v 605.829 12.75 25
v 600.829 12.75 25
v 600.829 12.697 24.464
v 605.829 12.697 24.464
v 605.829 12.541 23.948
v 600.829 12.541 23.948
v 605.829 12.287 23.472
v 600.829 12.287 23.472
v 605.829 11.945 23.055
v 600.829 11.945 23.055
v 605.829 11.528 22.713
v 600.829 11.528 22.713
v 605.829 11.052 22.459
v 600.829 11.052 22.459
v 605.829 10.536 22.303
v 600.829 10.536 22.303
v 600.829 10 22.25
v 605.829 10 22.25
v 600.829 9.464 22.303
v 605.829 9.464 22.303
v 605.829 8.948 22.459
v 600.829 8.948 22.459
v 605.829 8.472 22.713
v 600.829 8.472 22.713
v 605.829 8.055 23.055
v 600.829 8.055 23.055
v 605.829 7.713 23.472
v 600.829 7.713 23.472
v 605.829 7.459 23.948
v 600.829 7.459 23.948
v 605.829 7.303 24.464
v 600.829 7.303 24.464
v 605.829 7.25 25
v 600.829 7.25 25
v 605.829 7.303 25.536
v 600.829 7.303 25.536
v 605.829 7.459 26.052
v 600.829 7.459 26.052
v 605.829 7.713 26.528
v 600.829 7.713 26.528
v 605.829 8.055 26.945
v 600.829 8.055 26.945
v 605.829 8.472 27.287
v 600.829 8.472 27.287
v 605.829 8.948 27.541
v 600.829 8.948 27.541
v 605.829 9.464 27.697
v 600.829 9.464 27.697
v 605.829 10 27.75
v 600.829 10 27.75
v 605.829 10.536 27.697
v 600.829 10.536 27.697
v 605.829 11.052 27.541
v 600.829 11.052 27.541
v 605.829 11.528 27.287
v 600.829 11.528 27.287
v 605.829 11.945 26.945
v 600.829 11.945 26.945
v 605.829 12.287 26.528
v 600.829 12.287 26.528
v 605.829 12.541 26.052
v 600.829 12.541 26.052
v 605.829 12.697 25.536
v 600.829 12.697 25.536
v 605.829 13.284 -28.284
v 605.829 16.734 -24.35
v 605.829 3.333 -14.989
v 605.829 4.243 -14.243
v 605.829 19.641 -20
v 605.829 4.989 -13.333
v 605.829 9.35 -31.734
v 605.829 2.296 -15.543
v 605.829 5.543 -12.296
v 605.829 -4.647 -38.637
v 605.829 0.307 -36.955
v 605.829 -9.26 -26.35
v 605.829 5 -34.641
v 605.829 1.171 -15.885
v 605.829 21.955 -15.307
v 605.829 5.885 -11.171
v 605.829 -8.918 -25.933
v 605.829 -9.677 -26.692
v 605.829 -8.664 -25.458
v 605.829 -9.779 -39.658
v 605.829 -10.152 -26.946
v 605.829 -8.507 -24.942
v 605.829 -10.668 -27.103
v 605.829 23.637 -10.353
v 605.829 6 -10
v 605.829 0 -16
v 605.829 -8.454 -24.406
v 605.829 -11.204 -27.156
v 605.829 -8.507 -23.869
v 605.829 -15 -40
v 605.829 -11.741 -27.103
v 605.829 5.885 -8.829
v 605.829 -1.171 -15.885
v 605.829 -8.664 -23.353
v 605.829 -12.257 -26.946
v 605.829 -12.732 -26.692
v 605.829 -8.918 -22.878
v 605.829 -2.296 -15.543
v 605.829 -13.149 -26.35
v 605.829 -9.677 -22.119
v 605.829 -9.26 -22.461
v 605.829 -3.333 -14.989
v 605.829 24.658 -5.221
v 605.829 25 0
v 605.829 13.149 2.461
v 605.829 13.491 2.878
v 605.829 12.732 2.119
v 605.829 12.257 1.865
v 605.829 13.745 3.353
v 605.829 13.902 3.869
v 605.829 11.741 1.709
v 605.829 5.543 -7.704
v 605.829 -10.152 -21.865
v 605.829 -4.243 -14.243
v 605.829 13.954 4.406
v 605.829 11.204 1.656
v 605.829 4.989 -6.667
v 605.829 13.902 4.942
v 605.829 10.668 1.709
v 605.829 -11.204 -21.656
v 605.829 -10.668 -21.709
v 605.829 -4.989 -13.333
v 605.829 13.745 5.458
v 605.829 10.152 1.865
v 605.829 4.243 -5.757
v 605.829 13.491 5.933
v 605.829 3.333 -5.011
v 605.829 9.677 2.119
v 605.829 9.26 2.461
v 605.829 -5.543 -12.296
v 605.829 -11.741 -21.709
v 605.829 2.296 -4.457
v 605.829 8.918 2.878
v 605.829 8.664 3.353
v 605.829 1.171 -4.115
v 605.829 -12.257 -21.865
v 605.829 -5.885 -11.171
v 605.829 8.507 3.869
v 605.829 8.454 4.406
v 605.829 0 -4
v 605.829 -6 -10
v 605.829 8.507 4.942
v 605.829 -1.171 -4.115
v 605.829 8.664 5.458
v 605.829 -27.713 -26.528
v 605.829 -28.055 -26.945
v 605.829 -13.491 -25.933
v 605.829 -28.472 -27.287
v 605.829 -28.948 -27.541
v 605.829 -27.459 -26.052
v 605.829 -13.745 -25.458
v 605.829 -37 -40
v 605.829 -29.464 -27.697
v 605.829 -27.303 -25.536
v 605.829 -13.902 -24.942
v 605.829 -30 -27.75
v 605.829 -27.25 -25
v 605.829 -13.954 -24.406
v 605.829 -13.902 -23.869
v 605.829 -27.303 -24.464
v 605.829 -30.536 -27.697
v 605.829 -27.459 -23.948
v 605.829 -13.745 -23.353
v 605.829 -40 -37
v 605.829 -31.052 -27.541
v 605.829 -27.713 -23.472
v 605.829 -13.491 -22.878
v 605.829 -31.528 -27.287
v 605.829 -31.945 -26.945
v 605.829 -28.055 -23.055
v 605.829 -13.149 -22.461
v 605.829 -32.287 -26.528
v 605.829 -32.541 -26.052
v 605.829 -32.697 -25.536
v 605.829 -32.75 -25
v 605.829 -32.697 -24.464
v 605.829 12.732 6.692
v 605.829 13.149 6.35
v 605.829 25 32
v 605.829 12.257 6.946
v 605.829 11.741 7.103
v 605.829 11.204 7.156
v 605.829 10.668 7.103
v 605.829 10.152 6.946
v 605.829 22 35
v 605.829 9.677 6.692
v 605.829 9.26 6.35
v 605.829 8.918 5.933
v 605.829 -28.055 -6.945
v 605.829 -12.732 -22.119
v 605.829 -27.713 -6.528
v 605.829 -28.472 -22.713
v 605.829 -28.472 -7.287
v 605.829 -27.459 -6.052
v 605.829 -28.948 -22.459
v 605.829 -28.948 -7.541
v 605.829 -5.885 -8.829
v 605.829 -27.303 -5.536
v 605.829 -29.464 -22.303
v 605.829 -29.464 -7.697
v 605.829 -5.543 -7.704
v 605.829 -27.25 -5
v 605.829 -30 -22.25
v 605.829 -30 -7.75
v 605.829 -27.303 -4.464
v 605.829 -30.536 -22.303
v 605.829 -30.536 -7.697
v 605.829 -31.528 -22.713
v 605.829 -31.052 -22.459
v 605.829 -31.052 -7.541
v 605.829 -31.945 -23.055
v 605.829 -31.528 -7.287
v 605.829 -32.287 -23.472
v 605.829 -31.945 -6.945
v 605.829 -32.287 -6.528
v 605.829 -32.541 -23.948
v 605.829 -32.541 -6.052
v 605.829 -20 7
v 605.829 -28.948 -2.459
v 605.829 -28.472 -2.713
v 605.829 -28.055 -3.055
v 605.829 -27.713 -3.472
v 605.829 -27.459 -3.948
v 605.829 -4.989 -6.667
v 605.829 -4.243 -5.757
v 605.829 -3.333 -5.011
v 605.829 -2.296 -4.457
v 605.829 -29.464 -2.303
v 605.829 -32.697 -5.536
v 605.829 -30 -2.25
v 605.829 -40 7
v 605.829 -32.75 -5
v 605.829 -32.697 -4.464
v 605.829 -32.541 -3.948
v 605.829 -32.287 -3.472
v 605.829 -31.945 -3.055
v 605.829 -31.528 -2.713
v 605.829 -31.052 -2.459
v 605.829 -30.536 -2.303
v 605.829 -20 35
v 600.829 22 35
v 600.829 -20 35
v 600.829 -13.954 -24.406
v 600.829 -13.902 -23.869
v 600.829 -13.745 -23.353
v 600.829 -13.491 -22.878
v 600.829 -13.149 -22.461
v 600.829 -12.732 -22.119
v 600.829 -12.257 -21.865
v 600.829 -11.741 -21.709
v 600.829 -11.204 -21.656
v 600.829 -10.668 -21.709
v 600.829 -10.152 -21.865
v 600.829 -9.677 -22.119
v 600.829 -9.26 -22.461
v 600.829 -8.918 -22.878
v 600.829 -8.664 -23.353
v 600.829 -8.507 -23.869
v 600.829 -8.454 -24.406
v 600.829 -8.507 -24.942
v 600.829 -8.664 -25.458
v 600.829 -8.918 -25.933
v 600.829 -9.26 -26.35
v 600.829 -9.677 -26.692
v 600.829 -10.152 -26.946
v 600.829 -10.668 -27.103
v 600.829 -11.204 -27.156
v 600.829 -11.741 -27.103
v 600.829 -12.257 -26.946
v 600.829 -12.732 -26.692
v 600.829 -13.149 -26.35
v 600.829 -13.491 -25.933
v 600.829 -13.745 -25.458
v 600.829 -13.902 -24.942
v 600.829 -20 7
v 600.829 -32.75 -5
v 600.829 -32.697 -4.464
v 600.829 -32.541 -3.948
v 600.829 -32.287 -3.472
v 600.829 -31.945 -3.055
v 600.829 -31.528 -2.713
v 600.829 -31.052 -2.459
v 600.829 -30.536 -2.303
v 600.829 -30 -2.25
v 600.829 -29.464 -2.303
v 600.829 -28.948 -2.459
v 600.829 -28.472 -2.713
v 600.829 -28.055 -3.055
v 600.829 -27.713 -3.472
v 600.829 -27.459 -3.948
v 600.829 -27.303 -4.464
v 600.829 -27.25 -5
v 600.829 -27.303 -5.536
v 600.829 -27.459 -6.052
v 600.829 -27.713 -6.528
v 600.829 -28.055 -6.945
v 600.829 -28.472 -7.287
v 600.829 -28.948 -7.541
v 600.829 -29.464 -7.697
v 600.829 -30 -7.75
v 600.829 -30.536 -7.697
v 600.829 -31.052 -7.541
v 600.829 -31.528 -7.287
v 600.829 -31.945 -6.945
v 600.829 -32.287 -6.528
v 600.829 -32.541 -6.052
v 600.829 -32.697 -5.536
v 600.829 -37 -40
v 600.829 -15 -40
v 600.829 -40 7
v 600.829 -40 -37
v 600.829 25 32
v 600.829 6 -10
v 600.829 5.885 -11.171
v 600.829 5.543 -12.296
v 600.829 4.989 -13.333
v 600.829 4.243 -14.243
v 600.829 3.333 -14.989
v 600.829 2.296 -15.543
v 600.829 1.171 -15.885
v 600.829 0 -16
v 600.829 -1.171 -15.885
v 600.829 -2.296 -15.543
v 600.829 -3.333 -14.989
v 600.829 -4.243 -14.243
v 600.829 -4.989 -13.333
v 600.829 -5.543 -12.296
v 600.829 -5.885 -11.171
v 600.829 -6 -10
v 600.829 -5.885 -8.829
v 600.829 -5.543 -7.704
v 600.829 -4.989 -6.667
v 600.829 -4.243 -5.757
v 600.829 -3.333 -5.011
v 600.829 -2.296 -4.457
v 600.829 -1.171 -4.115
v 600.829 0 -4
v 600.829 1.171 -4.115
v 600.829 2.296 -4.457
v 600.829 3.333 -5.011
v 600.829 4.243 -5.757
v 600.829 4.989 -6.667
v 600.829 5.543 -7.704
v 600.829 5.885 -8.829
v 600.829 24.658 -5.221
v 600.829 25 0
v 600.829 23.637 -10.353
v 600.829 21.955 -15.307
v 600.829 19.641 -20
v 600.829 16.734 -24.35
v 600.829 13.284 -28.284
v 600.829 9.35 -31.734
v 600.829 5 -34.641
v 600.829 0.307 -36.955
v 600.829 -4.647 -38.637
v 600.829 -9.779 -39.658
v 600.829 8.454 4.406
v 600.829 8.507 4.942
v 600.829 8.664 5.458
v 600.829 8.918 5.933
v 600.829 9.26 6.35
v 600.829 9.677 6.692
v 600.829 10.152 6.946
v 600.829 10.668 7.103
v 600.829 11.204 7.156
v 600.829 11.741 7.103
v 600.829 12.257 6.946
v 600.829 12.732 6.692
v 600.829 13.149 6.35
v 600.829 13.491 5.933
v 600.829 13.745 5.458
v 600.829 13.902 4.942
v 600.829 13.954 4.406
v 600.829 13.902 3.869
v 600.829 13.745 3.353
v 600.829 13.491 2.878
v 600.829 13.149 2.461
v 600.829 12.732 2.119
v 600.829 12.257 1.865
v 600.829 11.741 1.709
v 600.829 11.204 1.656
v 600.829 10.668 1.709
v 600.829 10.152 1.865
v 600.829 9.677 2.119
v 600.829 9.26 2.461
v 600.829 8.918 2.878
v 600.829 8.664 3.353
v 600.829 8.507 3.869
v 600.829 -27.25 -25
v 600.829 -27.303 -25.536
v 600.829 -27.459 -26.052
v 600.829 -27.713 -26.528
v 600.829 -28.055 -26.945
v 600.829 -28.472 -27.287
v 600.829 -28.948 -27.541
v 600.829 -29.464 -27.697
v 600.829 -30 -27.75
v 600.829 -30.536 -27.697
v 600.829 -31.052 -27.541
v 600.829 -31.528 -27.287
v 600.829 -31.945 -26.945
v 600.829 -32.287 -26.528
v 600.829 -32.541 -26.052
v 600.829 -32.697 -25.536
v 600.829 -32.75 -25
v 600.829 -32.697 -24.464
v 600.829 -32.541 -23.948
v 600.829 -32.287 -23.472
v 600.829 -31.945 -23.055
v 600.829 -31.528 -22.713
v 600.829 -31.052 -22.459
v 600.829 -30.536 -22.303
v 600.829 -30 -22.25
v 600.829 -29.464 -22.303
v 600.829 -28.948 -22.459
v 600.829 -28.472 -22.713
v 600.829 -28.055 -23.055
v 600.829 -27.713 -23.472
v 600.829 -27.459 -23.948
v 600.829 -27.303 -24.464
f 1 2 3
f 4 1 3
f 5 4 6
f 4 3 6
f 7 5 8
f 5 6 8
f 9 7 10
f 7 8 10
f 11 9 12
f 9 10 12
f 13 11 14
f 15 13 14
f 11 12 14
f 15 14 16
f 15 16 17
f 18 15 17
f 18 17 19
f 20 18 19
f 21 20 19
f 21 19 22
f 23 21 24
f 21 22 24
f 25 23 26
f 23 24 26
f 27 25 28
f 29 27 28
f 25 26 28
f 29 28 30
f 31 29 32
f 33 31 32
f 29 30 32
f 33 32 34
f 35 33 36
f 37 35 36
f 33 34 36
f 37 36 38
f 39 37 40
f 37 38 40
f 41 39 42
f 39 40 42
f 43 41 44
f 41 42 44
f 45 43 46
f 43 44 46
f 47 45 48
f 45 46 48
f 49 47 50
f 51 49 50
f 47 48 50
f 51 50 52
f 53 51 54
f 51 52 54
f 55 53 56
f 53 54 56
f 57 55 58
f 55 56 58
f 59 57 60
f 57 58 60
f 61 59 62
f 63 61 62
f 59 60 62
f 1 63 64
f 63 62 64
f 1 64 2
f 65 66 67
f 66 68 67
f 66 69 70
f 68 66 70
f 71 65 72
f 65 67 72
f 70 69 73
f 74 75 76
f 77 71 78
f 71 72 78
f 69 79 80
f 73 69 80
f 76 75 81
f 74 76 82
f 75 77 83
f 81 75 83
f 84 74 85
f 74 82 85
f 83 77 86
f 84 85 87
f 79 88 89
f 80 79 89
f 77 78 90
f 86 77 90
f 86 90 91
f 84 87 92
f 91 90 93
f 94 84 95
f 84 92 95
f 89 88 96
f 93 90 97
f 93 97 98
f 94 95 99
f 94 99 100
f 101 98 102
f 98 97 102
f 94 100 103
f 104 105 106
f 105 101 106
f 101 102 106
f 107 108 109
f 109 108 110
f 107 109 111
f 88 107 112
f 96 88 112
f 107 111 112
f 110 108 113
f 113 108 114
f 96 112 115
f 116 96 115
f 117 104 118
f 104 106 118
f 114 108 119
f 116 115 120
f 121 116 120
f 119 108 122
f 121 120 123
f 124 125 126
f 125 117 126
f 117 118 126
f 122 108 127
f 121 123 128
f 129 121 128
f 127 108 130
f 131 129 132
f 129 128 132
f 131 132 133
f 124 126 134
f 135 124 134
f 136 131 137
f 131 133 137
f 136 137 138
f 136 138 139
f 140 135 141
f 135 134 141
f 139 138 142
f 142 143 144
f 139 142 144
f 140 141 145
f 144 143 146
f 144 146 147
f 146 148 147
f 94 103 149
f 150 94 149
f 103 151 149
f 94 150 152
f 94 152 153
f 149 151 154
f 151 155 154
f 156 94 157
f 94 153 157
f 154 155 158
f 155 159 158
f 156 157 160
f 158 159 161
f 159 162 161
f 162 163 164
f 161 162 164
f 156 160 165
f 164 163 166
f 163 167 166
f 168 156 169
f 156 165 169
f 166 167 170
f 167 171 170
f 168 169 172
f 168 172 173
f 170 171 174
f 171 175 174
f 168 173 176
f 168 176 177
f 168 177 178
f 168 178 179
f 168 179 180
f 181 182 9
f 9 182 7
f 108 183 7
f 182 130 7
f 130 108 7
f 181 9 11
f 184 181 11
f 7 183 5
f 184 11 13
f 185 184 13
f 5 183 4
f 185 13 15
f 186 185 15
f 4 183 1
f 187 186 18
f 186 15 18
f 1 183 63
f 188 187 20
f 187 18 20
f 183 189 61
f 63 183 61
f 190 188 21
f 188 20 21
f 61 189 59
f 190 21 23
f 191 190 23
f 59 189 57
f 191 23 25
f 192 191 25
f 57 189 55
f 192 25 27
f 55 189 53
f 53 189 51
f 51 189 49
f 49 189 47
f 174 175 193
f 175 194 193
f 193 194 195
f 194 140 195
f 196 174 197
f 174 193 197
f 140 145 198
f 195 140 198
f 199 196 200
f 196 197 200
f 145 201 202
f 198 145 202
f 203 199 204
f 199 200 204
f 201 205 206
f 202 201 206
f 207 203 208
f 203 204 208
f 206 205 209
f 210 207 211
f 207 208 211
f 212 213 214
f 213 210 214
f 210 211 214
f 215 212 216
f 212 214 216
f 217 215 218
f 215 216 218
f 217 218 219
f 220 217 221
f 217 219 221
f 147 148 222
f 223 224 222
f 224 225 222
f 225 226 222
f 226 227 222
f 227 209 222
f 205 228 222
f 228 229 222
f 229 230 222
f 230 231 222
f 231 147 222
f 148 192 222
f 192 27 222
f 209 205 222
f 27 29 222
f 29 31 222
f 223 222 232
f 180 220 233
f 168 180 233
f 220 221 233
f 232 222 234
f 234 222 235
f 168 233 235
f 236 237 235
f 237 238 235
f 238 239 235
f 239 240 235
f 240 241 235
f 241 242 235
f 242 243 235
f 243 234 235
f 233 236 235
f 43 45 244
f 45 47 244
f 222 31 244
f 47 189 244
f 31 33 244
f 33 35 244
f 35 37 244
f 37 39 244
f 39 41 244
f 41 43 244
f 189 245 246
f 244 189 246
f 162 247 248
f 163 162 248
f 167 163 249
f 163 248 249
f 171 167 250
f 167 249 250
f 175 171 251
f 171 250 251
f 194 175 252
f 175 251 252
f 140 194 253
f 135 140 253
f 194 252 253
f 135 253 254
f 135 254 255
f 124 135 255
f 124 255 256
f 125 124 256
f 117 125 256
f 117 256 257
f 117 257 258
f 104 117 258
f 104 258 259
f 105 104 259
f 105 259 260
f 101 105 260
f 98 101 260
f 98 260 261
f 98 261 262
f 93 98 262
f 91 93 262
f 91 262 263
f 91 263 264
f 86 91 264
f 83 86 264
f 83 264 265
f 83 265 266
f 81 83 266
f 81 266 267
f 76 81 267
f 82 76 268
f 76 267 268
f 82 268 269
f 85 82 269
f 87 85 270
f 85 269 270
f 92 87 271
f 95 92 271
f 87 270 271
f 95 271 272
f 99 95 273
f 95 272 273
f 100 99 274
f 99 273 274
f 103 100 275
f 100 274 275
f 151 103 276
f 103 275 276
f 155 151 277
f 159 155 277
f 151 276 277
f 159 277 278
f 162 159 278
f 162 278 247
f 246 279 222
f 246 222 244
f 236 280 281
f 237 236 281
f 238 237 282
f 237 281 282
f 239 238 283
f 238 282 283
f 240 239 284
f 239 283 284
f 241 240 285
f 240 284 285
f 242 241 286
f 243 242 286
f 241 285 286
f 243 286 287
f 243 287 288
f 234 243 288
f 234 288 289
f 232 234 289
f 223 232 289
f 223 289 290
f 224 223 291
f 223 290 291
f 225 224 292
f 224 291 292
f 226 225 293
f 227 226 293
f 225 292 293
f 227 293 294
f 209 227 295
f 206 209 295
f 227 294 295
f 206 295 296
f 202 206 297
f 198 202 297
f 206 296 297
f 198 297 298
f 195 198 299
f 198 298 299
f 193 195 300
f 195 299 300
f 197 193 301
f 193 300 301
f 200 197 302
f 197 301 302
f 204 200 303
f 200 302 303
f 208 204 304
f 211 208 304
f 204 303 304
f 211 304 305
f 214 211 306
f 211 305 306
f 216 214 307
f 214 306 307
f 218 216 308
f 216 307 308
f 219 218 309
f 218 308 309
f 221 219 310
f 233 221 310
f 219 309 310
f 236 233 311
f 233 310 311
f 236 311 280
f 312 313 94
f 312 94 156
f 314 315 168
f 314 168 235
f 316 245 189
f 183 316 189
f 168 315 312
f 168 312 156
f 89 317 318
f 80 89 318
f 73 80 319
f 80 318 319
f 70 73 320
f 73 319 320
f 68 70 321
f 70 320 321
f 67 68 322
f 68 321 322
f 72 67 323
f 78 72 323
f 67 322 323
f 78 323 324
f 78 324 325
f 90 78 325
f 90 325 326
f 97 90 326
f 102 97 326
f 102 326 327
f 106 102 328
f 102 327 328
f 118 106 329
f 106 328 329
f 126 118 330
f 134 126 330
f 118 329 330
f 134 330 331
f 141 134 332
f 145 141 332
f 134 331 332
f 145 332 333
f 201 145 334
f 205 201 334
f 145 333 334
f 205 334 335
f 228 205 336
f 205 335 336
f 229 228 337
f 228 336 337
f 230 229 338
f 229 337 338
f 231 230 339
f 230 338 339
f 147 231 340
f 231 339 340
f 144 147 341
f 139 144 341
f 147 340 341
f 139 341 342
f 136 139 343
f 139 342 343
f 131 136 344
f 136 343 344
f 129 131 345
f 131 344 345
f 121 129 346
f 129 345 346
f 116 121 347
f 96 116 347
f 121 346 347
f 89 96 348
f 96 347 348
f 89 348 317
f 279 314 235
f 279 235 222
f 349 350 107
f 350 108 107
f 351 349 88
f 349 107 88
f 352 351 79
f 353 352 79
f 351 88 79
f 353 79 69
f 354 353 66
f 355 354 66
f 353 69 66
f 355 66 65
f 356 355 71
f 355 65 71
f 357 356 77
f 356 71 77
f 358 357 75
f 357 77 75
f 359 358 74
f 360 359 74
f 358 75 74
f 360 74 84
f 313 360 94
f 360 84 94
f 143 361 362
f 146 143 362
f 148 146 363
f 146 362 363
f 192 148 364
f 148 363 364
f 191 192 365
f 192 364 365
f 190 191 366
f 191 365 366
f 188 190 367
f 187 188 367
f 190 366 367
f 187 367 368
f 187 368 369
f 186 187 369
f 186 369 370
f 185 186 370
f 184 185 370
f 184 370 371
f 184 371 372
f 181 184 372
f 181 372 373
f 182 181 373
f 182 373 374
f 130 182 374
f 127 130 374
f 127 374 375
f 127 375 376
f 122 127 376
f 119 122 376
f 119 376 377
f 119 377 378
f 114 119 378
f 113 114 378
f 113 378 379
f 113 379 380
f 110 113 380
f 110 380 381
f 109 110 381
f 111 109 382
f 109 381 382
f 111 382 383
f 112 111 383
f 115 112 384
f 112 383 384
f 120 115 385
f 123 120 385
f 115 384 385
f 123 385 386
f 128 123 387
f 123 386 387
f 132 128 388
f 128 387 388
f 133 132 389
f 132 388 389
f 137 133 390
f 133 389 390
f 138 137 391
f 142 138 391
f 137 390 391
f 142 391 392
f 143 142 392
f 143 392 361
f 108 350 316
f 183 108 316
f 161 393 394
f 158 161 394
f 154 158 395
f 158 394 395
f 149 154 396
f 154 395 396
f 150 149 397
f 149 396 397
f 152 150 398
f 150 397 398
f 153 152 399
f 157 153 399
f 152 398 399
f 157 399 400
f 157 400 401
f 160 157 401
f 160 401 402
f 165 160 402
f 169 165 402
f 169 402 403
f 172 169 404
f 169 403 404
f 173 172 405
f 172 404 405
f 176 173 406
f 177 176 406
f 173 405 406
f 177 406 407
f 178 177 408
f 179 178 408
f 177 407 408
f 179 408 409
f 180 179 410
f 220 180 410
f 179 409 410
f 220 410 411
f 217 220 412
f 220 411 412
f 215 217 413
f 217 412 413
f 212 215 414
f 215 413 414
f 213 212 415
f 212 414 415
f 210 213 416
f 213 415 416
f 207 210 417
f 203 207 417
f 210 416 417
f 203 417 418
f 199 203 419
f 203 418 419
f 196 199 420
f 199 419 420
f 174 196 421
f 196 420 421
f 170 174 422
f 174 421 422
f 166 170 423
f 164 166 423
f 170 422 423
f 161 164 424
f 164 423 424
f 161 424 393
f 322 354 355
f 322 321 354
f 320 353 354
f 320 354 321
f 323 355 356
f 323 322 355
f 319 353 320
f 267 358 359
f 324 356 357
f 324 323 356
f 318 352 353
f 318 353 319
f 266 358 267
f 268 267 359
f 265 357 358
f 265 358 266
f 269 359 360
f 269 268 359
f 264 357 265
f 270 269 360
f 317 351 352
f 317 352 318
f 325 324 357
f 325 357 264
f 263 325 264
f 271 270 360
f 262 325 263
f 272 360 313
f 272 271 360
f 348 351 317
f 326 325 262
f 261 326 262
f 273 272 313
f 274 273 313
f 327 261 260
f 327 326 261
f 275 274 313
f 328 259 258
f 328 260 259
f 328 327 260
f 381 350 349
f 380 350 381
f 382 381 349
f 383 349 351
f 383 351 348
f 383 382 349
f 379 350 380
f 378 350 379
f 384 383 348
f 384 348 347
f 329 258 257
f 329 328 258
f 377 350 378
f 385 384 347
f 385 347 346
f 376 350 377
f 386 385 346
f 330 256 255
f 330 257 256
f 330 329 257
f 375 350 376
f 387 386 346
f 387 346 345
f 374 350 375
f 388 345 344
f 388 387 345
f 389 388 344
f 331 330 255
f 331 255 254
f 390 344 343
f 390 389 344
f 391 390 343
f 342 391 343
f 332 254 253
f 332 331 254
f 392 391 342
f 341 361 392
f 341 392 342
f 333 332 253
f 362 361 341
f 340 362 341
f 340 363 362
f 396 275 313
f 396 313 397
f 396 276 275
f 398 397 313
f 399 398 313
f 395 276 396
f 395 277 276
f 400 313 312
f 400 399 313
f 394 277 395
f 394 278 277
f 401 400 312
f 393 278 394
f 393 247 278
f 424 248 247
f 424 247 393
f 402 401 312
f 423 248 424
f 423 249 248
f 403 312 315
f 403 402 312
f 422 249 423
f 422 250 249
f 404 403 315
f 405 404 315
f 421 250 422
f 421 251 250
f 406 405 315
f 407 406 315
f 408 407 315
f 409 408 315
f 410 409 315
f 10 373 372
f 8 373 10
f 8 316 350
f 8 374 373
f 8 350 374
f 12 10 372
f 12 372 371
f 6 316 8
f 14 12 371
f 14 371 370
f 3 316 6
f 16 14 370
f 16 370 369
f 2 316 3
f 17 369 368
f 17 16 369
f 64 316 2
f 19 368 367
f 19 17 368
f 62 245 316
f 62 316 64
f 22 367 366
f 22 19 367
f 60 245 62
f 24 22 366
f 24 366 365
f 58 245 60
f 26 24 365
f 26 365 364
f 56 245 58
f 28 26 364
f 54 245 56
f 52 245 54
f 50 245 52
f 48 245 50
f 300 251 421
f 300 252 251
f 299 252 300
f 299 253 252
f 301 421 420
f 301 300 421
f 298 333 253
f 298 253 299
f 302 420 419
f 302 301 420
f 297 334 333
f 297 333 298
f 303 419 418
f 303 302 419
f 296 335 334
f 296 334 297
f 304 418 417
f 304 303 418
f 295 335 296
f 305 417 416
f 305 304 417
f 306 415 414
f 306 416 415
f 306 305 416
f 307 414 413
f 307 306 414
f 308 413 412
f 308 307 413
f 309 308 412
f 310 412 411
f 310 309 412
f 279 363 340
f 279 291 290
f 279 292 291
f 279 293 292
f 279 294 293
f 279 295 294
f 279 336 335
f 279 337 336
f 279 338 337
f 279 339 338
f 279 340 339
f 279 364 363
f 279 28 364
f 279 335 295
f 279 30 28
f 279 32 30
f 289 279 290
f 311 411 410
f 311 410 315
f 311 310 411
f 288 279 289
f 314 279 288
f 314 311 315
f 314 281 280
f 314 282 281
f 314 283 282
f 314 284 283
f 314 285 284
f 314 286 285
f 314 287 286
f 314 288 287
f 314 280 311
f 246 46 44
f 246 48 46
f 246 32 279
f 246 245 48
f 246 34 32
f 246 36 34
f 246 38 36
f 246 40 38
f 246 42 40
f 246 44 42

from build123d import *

# Parameters (mm, degrees)
SKETCH1_W           = 65
SKETCH1_H           = 75
SKETCH1_R           = 2.75
SKETCH1_R_2         = 6
BOSS_EXTRUDE1_DEPTH = 5
CHAMFER1_SIZE       = 3
CUT_EXTRUDE1_REACH  = 58.789
SKETCH2_R           = 2.75
CUT_EXTRUDE2_REACH  = 58.789
SKETCH3_W           = 28
SKETCH3_H           = 20
FILLET1_R           = 40


with BuildPart() as part:
    # Sketch1 → Boss-Extrude1 (new body)
    with BuildSketch(Plane(origin=(600.828774839, 0, 0), x_dir=(0, -1, 0), z_dir=(-1, 0, 0))):
        with Locations((7.5, -2.5)):
            Rectangle(SKETCH1_W, SKETCH1_H)
        with Locations((30, -5)):
            Circle(SKETCH1_R, mode=Mode.SUBTRACT)
        with Locations(Location((-10, 25, 0), (0, 0, 180))):
            Circle(SKETCH1_R, mode=Mode.SUBTRACT)
        with Locations(Location((30, -25, 0), (0, 0, 180))):
            Circle(SKETCH1_R, mode=Mode.SUBTRACT)
        with Locations(Location((0, -10, 0), (0, 0, 180))):
            Circle(SKETCH1_R_2, mode=Mode.SUBTRACT)
    extrude(amount=-BOSS_EXTRUDE1_DEPTH)

    # Chamfer1
    chamfer1_edges = [part.edges().sort_by_distance(p)[0] for p in [
        (603.328774839, 25, 35),
        (603.328774839, -40, 35),
        (603.328774839, -40, -40),
    ]]
    chamfer(chamfer1_edges, length=CHAMFER1_SIZE)

    # Sketch2 → Cut-Extrude1 (cut, up to next)
    with BuildSketch(Plane.ZY.offset(-600.828774839), mode=Mode.PRIVATE) as cut_extrude1_sk1:
        with Locations(Location((4.405677967, 11.204416197, 0), (0, 0, 270))):
            Circle(SKETCH2_R)
    cut_extrude1_tool1 = extrude(cut_extrude1_sk1.sketch, amount=-CUT_EXTRUDE1_REACH, mode=Mode.PRIVATE) & part.part
    # Sketch2 → Cut-Extrude1 (cut, up to next)
    with BuildSketch(Plane.ZY.offset(-600.828774839), mode=Mode.PRIVATE) as cut_extrude1_sk2:
        with Locations(Location((-24.405677967, -11.204416197, 0), (0, 0, 270))):
            Circle(SKETCH2_R)
    cut_extrude1_tool2 = extrude(cut_extrude1_sk2.sketch, amount=-CUT_EXTRUDE1_REACH, mode=Mode.PRIVATE) & part.part
    add(cut_extrude1_tool1.solids().sort_by_distance((600.828775, 11.204416, 4.405678))[0], mode=Mode.SUBTRACT)
    add(cut_extrude1_tool2.solids().sort_by_distance((600.828775, -11.204416, -24.405678))[0], mode=Mode.SUBTRACT)

    # Sketch3 → Cut-Extrude2 (cut, up to next)
    with BuildSketch(Plane.ZY.offset(-600.828774839), mode=Mode.PRIVATE) as cut_extrude2_sk1:
        with Locations((21, -30)):
            Rectangle(SKETCH3_W, SKETCH3_H)
    cut_extrude2_tool1 = extrude(cut_extrude2_sk1.sketch, amount=-CUT_EXTRUDE2_REACH, mode=Mode.PRIVATE) & part.part
    add(cut_extrude2_tool1.solids().sort_by_distance((600.828775, -30, 21))[0], mode=Mode.SUBTRACT)

    # Fillet1
    fillet1_edges = [part.edges().sort_by_distance(p)[0] for p in [
        (603.328774839, 25, -40),
    ]]
    fillet(fillet1_edges, radius=FILLET1_R)


solid = part.part
